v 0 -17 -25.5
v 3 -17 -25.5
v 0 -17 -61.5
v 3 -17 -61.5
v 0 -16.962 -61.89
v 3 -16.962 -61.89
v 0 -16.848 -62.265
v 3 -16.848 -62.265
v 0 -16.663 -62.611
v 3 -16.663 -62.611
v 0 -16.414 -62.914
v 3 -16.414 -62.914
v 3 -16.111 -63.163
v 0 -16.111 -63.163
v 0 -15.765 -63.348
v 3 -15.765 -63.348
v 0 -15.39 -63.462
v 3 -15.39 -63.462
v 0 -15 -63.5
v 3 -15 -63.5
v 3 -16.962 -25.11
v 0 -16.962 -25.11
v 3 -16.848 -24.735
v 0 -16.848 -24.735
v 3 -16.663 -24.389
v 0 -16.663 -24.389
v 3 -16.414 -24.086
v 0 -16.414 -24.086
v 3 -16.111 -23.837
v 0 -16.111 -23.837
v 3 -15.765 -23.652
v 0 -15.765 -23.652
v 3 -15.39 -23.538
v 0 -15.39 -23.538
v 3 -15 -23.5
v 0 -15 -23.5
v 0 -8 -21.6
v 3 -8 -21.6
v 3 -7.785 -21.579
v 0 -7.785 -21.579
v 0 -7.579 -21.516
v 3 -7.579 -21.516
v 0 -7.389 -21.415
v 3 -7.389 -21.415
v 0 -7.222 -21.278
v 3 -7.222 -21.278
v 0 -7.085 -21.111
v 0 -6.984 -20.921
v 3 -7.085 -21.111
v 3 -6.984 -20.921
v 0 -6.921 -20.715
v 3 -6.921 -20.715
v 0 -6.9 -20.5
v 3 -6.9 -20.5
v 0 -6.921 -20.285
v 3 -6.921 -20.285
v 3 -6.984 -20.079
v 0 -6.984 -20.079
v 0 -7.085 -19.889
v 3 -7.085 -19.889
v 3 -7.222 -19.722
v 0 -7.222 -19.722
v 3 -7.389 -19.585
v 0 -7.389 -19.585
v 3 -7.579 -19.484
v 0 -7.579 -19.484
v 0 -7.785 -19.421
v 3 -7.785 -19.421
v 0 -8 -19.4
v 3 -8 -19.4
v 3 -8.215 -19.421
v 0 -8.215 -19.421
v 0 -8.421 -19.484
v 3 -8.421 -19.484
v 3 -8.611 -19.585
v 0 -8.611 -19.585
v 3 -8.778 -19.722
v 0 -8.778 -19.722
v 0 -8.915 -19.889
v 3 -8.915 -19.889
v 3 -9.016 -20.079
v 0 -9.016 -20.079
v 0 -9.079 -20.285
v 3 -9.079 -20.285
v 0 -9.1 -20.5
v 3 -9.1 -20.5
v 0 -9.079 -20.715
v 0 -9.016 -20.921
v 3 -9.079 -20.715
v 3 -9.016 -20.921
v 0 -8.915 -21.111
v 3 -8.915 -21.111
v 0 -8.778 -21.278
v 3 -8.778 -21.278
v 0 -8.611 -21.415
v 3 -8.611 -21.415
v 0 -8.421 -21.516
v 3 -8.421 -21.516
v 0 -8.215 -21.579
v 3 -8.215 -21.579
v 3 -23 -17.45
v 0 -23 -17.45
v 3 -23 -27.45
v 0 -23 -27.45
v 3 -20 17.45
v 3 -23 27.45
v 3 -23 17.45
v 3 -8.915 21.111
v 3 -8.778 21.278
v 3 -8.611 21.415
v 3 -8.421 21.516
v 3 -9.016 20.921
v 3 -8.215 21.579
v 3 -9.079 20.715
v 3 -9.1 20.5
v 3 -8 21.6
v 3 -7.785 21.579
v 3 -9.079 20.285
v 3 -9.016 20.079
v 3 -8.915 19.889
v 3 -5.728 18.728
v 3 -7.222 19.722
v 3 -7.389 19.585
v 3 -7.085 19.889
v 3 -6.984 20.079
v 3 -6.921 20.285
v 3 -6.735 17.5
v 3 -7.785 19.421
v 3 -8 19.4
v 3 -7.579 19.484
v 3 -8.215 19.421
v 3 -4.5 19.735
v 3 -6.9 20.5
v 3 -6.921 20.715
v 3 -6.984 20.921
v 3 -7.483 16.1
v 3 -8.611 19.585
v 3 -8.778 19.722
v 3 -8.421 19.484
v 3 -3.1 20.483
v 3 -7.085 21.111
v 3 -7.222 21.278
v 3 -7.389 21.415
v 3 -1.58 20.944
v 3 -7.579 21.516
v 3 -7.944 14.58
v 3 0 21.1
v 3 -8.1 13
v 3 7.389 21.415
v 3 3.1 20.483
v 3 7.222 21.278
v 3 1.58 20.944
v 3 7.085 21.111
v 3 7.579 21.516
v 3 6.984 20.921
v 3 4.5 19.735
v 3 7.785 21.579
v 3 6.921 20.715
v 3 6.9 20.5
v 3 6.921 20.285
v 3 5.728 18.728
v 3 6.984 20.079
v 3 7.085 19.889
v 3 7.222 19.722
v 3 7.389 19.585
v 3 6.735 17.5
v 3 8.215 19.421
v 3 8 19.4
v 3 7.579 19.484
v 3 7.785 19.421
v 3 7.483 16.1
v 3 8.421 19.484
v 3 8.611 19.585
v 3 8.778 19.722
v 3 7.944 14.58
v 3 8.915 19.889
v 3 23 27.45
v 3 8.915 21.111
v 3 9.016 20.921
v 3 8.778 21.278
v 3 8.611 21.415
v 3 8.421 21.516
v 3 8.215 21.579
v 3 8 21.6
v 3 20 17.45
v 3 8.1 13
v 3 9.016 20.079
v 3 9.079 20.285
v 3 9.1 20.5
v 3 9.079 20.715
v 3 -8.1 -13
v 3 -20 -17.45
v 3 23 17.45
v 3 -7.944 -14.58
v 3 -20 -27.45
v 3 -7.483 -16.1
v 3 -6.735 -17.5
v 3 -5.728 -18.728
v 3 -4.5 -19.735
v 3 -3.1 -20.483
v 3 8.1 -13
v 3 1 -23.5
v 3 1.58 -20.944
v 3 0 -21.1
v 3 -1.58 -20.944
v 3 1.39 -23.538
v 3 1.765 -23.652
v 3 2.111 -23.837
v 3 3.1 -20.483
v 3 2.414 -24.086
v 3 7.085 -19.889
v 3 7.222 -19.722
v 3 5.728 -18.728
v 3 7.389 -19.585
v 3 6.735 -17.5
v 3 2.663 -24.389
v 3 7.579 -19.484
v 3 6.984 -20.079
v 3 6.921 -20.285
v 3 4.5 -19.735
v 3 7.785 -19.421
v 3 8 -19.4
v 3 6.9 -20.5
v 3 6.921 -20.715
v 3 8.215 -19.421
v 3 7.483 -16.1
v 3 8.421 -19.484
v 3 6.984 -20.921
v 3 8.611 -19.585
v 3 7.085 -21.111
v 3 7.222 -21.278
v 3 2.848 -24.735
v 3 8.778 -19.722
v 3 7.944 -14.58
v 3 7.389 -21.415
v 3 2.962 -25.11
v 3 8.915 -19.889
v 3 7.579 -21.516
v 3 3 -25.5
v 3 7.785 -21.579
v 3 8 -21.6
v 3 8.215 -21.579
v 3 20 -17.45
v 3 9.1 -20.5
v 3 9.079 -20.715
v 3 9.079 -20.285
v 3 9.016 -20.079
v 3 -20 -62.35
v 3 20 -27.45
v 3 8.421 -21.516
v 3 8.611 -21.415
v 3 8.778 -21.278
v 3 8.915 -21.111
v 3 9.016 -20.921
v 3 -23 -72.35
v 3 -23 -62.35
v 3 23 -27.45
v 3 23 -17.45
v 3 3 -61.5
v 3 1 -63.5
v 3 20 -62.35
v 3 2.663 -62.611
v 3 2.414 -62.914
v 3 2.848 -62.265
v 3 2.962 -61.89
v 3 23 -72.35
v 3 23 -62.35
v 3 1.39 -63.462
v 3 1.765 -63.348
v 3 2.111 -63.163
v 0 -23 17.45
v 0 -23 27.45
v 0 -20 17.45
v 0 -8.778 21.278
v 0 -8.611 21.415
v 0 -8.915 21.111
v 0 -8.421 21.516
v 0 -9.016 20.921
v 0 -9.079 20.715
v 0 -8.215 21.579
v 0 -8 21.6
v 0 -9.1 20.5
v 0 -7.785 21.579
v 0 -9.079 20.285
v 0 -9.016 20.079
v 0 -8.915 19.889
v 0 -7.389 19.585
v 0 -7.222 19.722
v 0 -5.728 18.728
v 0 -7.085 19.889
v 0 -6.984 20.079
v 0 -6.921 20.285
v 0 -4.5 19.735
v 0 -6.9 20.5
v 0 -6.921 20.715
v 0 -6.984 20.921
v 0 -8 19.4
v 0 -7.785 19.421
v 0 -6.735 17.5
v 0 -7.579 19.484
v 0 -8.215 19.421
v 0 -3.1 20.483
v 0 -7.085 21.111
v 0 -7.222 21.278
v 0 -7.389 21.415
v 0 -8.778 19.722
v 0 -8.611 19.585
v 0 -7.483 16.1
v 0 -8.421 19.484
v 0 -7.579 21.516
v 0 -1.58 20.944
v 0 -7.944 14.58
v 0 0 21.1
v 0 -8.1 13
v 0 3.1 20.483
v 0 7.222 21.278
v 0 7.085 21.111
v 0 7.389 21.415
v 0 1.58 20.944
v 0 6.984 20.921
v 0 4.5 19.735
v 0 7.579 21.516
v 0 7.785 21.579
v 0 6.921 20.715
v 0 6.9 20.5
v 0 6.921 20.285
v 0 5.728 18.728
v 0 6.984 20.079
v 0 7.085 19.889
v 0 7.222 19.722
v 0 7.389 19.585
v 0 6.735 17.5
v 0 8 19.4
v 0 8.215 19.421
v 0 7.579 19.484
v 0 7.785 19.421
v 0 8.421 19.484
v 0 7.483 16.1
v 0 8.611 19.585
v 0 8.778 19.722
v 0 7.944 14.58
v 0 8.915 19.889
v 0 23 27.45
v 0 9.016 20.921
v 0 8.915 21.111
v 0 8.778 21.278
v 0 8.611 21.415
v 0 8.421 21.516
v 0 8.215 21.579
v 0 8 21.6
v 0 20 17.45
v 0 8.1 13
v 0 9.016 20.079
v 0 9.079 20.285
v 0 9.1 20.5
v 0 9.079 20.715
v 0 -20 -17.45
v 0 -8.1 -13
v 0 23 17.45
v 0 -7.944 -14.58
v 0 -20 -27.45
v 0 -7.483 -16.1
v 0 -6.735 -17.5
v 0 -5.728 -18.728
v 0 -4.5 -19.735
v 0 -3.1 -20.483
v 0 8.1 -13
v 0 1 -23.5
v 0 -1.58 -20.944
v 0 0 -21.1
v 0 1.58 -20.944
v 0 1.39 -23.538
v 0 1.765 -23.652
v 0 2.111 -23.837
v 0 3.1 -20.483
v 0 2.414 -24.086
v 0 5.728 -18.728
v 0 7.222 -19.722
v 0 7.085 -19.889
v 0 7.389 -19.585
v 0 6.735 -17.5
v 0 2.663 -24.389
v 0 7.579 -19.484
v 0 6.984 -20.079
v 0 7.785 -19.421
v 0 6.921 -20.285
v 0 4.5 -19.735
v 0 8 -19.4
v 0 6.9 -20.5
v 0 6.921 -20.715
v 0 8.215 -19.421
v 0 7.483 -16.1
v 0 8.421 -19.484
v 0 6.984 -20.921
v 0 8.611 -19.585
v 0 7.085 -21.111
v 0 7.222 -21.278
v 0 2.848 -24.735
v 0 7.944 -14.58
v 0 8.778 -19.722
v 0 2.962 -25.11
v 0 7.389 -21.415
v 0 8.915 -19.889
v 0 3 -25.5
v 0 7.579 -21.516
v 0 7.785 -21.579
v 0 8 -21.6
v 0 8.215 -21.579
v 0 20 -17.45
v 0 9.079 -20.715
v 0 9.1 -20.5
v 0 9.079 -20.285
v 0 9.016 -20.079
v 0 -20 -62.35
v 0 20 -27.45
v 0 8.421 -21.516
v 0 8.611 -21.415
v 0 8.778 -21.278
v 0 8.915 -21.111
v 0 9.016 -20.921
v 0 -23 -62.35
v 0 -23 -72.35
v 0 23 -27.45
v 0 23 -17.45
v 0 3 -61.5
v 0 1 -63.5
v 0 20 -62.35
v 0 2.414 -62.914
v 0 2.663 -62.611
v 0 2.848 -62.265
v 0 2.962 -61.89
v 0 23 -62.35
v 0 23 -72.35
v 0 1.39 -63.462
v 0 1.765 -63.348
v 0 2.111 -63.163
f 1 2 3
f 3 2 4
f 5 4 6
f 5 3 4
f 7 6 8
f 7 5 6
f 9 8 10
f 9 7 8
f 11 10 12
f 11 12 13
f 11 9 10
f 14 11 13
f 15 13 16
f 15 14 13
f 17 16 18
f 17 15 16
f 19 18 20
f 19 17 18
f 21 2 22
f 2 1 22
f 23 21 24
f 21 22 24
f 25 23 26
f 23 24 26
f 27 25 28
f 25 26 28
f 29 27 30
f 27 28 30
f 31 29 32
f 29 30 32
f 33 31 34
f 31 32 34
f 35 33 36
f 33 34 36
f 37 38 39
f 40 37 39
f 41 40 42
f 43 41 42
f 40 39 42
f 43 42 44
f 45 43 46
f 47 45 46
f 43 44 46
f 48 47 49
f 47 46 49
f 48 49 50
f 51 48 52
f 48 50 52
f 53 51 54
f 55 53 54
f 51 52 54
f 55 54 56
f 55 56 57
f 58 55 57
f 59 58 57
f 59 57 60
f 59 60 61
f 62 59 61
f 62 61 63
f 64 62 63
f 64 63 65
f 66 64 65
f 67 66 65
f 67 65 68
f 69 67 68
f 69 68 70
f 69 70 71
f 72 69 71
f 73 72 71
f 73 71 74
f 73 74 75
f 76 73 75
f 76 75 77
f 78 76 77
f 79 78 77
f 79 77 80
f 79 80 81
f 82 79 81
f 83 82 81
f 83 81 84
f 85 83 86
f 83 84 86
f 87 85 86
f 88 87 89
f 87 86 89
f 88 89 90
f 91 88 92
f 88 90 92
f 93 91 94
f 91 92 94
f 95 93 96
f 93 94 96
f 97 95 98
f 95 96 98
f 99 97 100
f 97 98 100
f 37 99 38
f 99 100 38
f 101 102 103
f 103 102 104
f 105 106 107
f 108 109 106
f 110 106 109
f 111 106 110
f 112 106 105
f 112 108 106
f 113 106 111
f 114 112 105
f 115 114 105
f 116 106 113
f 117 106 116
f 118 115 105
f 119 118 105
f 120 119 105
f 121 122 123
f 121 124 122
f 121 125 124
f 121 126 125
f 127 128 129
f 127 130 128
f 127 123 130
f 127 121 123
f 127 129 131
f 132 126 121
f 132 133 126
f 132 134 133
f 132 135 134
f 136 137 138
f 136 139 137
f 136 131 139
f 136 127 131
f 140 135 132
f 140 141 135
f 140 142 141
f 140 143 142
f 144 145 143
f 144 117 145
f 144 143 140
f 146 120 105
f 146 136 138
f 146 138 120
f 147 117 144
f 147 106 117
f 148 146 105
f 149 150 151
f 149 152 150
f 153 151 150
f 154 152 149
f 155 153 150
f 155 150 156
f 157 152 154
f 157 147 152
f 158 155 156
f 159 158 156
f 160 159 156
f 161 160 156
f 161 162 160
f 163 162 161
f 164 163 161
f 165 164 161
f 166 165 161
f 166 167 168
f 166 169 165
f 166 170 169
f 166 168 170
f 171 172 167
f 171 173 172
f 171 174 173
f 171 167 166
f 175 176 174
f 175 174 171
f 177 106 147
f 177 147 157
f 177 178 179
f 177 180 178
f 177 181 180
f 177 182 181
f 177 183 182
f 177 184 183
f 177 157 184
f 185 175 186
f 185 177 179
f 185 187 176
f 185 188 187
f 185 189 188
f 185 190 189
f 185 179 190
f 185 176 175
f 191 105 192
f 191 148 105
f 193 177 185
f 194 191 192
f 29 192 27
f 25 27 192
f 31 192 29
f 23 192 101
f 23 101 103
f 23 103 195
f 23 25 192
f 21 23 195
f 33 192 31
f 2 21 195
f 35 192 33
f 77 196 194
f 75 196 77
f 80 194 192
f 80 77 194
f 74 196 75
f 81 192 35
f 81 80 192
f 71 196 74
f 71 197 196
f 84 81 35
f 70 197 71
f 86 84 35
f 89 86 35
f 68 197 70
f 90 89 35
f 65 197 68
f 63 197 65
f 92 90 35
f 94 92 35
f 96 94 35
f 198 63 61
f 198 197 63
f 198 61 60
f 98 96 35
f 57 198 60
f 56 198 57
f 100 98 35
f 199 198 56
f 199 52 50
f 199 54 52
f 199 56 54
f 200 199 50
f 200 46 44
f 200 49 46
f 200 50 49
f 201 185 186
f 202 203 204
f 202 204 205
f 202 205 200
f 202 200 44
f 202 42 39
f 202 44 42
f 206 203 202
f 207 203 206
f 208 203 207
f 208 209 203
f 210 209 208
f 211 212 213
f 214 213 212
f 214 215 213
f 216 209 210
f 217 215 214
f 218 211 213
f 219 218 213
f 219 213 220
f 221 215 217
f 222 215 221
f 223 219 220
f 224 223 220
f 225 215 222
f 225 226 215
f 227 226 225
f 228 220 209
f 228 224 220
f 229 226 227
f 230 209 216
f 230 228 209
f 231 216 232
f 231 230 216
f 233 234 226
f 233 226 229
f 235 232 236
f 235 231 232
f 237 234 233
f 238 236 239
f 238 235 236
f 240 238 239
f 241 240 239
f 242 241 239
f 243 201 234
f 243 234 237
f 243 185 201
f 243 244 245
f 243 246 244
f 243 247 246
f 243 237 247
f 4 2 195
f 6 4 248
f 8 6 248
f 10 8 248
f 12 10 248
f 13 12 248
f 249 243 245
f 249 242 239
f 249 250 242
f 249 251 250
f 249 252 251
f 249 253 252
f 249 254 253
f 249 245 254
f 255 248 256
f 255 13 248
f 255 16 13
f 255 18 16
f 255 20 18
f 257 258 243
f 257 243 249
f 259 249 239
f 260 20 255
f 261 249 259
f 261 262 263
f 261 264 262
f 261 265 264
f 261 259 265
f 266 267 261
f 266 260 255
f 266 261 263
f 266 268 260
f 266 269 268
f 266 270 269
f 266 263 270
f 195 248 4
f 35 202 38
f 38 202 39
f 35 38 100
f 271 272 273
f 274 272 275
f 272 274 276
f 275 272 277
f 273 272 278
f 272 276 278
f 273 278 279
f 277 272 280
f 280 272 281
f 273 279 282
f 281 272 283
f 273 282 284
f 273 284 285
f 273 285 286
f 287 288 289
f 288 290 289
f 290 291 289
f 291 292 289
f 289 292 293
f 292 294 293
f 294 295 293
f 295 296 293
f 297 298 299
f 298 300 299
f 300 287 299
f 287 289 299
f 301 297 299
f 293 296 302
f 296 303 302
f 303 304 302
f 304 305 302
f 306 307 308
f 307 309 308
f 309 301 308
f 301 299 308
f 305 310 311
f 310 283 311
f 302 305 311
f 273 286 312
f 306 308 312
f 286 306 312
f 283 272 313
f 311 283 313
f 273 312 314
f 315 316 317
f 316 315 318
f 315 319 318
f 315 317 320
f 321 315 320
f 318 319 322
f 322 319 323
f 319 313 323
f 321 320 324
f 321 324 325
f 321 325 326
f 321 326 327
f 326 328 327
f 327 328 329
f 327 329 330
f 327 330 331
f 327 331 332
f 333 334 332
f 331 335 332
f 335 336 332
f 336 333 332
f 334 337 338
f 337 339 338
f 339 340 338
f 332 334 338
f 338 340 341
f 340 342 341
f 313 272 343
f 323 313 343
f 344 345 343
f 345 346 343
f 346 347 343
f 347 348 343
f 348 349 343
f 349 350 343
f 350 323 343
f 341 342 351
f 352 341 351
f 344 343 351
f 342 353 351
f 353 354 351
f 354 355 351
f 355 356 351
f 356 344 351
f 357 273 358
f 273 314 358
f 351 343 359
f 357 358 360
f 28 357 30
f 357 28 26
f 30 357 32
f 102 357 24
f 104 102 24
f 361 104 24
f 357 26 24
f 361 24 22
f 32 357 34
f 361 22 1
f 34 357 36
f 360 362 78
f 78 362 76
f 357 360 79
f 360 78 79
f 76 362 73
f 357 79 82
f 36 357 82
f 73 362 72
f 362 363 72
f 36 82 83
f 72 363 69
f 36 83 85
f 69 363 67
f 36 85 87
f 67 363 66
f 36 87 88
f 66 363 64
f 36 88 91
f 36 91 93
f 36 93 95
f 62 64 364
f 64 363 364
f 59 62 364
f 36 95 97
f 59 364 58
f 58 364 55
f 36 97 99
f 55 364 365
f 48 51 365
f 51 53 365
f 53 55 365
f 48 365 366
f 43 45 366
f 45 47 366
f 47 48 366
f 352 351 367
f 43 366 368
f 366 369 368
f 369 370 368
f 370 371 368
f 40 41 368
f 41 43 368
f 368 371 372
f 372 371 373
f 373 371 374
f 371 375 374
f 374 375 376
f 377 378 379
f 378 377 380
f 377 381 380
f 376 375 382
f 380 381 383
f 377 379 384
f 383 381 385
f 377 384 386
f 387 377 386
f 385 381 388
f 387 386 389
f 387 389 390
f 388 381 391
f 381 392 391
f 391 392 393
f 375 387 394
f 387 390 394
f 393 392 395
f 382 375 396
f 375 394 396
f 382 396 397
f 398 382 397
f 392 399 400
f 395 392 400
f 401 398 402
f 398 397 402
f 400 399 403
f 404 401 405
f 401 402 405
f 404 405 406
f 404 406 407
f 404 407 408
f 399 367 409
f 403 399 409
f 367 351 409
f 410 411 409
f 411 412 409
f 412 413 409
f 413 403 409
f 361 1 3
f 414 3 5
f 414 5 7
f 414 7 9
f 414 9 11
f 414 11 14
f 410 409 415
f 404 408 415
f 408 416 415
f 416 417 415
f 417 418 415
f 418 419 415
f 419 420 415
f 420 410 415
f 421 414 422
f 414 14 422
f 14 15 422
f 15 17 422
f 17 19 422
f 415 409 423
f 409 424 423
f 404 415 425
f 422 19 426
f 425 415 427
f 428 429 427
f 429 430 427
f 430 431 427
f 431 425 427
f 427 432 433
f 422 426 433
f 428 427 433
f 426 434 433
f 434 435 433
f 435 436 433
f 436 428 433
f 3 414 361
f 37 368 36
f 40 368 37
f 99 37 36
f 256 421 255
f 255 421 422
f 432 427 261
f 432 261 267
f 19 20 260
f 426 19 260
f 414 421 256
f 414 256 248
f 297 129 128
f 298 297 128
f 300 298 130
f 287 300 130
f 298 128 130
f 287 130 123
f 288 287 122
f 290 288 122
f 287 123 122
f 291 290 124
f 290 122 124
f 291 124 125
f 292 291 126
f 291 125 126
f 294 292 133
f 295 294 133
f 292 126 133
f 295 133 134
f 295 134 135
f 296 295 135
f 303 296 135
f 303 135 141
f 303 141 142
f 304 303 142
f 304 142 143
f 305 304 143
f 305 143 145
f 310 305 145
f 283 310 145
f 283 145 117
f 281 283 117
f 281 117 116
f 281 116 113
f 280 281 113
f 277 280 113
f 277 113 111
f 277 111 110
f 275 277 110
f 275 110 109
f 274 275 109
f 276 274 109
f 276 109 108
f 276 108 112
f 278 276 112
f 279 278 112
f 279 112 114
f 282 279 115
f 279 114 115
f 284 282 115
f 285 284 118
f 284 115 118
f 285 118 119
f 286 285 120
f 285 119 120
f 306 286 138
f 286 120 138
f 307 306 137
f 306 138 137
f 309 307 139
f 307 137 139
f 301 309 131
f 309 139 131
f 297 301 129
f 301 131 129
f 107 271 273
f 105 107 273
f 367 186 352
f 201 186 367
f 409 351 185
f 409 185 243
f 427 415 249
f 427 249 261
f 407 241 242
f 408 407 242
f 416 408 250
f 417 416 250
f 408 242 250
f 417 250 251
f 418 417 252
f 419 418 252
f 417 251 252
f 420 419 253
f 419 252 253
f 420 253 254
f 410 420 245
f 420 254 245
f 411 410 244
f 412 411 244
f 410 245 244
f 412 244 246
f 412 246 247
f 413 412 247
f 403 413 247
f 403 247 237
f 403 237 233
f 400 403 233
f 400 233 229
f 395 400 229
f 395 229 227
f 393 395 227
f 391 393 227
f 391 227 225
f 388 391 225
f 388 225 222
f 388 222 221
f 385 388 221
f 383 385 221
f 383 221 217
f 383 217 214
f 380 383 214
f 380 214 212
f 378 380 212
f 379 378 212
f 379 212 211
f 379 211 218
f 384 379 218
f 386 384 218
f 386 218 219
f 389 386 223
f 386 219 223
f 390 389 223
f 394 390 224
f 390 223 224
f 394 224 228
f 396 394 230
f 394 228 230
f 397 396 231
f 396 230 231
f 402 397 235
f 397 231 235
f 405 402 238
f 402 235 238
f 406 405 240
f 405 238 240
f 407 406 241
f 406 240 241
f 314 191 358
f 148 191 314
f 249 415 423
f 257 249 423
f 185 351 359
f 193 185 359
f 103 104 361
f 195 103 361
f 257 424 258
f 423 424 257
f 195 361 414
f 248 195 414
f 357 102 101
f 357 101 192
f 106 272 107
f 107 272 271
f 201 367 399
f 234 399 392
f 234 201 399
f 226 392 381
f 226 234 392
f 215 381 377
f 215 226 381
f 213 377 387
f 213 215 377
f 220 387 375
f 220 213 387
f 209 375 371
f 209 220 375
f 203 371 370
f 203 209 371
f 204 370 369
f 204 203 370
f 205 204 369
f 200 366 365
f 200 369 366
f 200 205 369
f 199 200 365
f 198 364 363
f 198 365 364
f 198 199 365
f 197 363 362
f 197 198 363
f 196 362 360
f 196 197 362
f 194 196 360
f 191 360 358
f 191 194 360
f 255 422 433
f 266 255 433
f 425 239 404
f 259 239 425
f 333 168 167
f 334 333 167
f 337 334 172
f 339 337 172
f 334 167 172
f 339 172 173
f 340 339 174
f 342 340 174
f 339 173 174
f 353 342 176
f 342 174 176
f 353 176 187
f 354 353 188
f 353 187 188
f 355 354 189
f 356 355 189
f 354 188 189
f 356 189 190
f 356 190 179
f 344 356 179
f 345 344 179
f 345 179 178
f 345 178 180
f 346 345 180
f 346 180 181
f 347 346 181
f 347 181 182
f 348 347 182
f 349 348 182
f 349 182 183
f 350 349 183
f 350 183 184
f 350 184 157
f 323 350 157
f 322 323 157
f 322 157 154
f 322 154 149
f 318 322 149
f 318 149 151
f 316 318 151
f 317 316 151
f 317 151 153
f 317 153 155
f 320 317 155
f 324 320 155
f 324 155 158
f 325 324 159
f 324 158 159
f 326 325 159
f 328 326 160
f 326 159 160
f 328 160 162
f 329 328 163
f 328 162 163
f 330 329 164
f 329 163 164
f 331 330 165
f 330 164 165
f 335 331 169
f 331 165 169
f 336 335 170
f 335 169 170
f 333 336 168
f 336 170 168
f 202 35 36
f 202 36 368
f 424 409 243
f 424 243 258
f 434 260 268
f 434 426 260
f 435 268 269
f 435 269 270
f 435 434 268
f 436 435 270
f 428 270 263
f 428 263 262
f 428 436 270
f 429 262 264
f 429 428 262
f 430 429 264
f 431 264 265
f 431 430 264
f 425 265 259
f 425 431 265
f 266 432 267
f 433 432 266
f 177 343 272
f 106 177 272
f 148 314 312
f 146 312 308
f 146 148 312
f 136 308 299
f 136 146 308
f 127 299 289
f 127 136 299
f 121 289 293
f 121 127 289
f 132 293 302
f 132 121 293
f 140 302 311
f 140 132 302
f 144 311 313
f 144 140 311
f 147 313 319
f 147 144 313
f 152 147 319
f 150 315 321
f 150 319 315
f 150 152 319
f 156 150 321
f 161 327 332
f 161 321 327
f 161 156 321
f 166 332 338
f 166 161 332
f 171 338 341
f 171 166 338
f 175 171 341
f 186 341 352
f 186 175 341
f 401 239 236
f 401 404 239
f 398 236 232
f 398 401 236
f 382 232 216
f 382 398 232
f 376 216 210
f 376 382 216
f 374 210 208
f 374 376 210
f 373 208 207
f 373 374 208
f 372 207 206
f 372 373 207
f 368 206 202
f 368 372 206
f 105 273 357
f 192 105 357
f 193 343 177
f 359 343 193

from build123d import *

# Parameters (mm, degrees)
SKETCH1_W           = 99.8
SKETCH1_H           = 40
SKETCH1_W_2         = 10
SKETCH1_H_2         = 3
BOSS_EXTRUDE1_DEPTH = 3
SKETCH2_R           = 1.1
CUT_EXTRUDE1_DEPTH  = 76.977118266
SKETCH3_W           = 40
SKETCH3_H           = 20
CUT_EXTRUDE2_DEPTH  = 76.977118266
FILLET1_R           = 2


with BuildPart() as part:
    # Sketch1 → Boss-Extrude1 (new body)
    with BuildSketch(Plane(origin=(0, 0, 0), x_dir=(0, 0, -1), z_dir=(1, 0, 0))):
        with Locations((22.45, 0)):
            Rectangle(SKETCH1_W, SKETCH1_H)
        with Locations((-22.45, 21.5)):
            Rectangle(SKETCH1_W_2, SKETCH1_H_2)
        with Locations((22.45, 21.5)):
            Rectangle(SKETCH1_W_2, SKETCH1_H_2)
        with Locations((67.35, 21.5)):
            Rectangle(SKETCH1_W_2, SKETCH1_H_2)
        with Locations((67.35, -21.5)):
            Rectangle(SKETCH1_W_2, SKETCH1_H_2)
        with Locations((22.45, -21.5)):
            Rectangle(SKETCH1_W_2, SKETCH1_H_2)
        with Locations((-22.45, -21.5)):
            Rectangle(SKETCH1_W_2, SKETCH1_H_2)
    extrude(amount=BOSS_EXTRUDE1_DEPTH)

    # Sketch2 → Cut-Extrude1 (cut, through all)
    with BuildSketch(Plane(origin=(3, 0, 0), x_dir=(0, 0, -1), z_dir=(1, 0, 0))):
        with Locations((-20.5, 8)):
            Circle(SKETCH2_R)
        with Locations((-20.5, -8)):
            Circle(SKETCH2_R)
        with Locations((20.5, 8)):
            Circle(SKETCH2_R)
        with Locations((20.5, -8)):
            Circle(SKETCH2_R)
        with BuildLine():
            Line((-13, 8.1), (13, 8.1))
            ThreePointArc((13, 8.1), (21.1, 0), (13, -8.1))
            Line((13, -8.1), (-13, -8.1))
            ThreePointArc((-13, -8.1), (-21.1, 0), (-13, 8.1))
        make_face()
    extrude(amount=-CUT_EXTRUDE1_DEPTH, mode=Mode.SUBTRACT)

    # Sketch3 → Cut-Extrude2 (cut, through all)
    with BuildSketch(Plane(origin=(3, 0, 0), x_dir=(0, 0, -1), z_dir=(1, 0, 0))):
        with Locations((43.5, -7)):
            Rectangle(SKETCH3_W, SKETCH3_H)
    extrude(amount=-CUT_EXTRUDE2_DEPTH, mode=Mode.SUBTRACT)

    # Fillet1
    fillet1_edges = [part.edges().sort_by_distance(p)[0] for p in [
        (1.5, -17, -23.5),
        (1.5, 3, -23.5),
        (1.5, 3, -63.5),
        (1.5, -17, -63.5),
    ]]
    fillet(fillet1_edges, radius=FILLET1_R)


solid = part.part
